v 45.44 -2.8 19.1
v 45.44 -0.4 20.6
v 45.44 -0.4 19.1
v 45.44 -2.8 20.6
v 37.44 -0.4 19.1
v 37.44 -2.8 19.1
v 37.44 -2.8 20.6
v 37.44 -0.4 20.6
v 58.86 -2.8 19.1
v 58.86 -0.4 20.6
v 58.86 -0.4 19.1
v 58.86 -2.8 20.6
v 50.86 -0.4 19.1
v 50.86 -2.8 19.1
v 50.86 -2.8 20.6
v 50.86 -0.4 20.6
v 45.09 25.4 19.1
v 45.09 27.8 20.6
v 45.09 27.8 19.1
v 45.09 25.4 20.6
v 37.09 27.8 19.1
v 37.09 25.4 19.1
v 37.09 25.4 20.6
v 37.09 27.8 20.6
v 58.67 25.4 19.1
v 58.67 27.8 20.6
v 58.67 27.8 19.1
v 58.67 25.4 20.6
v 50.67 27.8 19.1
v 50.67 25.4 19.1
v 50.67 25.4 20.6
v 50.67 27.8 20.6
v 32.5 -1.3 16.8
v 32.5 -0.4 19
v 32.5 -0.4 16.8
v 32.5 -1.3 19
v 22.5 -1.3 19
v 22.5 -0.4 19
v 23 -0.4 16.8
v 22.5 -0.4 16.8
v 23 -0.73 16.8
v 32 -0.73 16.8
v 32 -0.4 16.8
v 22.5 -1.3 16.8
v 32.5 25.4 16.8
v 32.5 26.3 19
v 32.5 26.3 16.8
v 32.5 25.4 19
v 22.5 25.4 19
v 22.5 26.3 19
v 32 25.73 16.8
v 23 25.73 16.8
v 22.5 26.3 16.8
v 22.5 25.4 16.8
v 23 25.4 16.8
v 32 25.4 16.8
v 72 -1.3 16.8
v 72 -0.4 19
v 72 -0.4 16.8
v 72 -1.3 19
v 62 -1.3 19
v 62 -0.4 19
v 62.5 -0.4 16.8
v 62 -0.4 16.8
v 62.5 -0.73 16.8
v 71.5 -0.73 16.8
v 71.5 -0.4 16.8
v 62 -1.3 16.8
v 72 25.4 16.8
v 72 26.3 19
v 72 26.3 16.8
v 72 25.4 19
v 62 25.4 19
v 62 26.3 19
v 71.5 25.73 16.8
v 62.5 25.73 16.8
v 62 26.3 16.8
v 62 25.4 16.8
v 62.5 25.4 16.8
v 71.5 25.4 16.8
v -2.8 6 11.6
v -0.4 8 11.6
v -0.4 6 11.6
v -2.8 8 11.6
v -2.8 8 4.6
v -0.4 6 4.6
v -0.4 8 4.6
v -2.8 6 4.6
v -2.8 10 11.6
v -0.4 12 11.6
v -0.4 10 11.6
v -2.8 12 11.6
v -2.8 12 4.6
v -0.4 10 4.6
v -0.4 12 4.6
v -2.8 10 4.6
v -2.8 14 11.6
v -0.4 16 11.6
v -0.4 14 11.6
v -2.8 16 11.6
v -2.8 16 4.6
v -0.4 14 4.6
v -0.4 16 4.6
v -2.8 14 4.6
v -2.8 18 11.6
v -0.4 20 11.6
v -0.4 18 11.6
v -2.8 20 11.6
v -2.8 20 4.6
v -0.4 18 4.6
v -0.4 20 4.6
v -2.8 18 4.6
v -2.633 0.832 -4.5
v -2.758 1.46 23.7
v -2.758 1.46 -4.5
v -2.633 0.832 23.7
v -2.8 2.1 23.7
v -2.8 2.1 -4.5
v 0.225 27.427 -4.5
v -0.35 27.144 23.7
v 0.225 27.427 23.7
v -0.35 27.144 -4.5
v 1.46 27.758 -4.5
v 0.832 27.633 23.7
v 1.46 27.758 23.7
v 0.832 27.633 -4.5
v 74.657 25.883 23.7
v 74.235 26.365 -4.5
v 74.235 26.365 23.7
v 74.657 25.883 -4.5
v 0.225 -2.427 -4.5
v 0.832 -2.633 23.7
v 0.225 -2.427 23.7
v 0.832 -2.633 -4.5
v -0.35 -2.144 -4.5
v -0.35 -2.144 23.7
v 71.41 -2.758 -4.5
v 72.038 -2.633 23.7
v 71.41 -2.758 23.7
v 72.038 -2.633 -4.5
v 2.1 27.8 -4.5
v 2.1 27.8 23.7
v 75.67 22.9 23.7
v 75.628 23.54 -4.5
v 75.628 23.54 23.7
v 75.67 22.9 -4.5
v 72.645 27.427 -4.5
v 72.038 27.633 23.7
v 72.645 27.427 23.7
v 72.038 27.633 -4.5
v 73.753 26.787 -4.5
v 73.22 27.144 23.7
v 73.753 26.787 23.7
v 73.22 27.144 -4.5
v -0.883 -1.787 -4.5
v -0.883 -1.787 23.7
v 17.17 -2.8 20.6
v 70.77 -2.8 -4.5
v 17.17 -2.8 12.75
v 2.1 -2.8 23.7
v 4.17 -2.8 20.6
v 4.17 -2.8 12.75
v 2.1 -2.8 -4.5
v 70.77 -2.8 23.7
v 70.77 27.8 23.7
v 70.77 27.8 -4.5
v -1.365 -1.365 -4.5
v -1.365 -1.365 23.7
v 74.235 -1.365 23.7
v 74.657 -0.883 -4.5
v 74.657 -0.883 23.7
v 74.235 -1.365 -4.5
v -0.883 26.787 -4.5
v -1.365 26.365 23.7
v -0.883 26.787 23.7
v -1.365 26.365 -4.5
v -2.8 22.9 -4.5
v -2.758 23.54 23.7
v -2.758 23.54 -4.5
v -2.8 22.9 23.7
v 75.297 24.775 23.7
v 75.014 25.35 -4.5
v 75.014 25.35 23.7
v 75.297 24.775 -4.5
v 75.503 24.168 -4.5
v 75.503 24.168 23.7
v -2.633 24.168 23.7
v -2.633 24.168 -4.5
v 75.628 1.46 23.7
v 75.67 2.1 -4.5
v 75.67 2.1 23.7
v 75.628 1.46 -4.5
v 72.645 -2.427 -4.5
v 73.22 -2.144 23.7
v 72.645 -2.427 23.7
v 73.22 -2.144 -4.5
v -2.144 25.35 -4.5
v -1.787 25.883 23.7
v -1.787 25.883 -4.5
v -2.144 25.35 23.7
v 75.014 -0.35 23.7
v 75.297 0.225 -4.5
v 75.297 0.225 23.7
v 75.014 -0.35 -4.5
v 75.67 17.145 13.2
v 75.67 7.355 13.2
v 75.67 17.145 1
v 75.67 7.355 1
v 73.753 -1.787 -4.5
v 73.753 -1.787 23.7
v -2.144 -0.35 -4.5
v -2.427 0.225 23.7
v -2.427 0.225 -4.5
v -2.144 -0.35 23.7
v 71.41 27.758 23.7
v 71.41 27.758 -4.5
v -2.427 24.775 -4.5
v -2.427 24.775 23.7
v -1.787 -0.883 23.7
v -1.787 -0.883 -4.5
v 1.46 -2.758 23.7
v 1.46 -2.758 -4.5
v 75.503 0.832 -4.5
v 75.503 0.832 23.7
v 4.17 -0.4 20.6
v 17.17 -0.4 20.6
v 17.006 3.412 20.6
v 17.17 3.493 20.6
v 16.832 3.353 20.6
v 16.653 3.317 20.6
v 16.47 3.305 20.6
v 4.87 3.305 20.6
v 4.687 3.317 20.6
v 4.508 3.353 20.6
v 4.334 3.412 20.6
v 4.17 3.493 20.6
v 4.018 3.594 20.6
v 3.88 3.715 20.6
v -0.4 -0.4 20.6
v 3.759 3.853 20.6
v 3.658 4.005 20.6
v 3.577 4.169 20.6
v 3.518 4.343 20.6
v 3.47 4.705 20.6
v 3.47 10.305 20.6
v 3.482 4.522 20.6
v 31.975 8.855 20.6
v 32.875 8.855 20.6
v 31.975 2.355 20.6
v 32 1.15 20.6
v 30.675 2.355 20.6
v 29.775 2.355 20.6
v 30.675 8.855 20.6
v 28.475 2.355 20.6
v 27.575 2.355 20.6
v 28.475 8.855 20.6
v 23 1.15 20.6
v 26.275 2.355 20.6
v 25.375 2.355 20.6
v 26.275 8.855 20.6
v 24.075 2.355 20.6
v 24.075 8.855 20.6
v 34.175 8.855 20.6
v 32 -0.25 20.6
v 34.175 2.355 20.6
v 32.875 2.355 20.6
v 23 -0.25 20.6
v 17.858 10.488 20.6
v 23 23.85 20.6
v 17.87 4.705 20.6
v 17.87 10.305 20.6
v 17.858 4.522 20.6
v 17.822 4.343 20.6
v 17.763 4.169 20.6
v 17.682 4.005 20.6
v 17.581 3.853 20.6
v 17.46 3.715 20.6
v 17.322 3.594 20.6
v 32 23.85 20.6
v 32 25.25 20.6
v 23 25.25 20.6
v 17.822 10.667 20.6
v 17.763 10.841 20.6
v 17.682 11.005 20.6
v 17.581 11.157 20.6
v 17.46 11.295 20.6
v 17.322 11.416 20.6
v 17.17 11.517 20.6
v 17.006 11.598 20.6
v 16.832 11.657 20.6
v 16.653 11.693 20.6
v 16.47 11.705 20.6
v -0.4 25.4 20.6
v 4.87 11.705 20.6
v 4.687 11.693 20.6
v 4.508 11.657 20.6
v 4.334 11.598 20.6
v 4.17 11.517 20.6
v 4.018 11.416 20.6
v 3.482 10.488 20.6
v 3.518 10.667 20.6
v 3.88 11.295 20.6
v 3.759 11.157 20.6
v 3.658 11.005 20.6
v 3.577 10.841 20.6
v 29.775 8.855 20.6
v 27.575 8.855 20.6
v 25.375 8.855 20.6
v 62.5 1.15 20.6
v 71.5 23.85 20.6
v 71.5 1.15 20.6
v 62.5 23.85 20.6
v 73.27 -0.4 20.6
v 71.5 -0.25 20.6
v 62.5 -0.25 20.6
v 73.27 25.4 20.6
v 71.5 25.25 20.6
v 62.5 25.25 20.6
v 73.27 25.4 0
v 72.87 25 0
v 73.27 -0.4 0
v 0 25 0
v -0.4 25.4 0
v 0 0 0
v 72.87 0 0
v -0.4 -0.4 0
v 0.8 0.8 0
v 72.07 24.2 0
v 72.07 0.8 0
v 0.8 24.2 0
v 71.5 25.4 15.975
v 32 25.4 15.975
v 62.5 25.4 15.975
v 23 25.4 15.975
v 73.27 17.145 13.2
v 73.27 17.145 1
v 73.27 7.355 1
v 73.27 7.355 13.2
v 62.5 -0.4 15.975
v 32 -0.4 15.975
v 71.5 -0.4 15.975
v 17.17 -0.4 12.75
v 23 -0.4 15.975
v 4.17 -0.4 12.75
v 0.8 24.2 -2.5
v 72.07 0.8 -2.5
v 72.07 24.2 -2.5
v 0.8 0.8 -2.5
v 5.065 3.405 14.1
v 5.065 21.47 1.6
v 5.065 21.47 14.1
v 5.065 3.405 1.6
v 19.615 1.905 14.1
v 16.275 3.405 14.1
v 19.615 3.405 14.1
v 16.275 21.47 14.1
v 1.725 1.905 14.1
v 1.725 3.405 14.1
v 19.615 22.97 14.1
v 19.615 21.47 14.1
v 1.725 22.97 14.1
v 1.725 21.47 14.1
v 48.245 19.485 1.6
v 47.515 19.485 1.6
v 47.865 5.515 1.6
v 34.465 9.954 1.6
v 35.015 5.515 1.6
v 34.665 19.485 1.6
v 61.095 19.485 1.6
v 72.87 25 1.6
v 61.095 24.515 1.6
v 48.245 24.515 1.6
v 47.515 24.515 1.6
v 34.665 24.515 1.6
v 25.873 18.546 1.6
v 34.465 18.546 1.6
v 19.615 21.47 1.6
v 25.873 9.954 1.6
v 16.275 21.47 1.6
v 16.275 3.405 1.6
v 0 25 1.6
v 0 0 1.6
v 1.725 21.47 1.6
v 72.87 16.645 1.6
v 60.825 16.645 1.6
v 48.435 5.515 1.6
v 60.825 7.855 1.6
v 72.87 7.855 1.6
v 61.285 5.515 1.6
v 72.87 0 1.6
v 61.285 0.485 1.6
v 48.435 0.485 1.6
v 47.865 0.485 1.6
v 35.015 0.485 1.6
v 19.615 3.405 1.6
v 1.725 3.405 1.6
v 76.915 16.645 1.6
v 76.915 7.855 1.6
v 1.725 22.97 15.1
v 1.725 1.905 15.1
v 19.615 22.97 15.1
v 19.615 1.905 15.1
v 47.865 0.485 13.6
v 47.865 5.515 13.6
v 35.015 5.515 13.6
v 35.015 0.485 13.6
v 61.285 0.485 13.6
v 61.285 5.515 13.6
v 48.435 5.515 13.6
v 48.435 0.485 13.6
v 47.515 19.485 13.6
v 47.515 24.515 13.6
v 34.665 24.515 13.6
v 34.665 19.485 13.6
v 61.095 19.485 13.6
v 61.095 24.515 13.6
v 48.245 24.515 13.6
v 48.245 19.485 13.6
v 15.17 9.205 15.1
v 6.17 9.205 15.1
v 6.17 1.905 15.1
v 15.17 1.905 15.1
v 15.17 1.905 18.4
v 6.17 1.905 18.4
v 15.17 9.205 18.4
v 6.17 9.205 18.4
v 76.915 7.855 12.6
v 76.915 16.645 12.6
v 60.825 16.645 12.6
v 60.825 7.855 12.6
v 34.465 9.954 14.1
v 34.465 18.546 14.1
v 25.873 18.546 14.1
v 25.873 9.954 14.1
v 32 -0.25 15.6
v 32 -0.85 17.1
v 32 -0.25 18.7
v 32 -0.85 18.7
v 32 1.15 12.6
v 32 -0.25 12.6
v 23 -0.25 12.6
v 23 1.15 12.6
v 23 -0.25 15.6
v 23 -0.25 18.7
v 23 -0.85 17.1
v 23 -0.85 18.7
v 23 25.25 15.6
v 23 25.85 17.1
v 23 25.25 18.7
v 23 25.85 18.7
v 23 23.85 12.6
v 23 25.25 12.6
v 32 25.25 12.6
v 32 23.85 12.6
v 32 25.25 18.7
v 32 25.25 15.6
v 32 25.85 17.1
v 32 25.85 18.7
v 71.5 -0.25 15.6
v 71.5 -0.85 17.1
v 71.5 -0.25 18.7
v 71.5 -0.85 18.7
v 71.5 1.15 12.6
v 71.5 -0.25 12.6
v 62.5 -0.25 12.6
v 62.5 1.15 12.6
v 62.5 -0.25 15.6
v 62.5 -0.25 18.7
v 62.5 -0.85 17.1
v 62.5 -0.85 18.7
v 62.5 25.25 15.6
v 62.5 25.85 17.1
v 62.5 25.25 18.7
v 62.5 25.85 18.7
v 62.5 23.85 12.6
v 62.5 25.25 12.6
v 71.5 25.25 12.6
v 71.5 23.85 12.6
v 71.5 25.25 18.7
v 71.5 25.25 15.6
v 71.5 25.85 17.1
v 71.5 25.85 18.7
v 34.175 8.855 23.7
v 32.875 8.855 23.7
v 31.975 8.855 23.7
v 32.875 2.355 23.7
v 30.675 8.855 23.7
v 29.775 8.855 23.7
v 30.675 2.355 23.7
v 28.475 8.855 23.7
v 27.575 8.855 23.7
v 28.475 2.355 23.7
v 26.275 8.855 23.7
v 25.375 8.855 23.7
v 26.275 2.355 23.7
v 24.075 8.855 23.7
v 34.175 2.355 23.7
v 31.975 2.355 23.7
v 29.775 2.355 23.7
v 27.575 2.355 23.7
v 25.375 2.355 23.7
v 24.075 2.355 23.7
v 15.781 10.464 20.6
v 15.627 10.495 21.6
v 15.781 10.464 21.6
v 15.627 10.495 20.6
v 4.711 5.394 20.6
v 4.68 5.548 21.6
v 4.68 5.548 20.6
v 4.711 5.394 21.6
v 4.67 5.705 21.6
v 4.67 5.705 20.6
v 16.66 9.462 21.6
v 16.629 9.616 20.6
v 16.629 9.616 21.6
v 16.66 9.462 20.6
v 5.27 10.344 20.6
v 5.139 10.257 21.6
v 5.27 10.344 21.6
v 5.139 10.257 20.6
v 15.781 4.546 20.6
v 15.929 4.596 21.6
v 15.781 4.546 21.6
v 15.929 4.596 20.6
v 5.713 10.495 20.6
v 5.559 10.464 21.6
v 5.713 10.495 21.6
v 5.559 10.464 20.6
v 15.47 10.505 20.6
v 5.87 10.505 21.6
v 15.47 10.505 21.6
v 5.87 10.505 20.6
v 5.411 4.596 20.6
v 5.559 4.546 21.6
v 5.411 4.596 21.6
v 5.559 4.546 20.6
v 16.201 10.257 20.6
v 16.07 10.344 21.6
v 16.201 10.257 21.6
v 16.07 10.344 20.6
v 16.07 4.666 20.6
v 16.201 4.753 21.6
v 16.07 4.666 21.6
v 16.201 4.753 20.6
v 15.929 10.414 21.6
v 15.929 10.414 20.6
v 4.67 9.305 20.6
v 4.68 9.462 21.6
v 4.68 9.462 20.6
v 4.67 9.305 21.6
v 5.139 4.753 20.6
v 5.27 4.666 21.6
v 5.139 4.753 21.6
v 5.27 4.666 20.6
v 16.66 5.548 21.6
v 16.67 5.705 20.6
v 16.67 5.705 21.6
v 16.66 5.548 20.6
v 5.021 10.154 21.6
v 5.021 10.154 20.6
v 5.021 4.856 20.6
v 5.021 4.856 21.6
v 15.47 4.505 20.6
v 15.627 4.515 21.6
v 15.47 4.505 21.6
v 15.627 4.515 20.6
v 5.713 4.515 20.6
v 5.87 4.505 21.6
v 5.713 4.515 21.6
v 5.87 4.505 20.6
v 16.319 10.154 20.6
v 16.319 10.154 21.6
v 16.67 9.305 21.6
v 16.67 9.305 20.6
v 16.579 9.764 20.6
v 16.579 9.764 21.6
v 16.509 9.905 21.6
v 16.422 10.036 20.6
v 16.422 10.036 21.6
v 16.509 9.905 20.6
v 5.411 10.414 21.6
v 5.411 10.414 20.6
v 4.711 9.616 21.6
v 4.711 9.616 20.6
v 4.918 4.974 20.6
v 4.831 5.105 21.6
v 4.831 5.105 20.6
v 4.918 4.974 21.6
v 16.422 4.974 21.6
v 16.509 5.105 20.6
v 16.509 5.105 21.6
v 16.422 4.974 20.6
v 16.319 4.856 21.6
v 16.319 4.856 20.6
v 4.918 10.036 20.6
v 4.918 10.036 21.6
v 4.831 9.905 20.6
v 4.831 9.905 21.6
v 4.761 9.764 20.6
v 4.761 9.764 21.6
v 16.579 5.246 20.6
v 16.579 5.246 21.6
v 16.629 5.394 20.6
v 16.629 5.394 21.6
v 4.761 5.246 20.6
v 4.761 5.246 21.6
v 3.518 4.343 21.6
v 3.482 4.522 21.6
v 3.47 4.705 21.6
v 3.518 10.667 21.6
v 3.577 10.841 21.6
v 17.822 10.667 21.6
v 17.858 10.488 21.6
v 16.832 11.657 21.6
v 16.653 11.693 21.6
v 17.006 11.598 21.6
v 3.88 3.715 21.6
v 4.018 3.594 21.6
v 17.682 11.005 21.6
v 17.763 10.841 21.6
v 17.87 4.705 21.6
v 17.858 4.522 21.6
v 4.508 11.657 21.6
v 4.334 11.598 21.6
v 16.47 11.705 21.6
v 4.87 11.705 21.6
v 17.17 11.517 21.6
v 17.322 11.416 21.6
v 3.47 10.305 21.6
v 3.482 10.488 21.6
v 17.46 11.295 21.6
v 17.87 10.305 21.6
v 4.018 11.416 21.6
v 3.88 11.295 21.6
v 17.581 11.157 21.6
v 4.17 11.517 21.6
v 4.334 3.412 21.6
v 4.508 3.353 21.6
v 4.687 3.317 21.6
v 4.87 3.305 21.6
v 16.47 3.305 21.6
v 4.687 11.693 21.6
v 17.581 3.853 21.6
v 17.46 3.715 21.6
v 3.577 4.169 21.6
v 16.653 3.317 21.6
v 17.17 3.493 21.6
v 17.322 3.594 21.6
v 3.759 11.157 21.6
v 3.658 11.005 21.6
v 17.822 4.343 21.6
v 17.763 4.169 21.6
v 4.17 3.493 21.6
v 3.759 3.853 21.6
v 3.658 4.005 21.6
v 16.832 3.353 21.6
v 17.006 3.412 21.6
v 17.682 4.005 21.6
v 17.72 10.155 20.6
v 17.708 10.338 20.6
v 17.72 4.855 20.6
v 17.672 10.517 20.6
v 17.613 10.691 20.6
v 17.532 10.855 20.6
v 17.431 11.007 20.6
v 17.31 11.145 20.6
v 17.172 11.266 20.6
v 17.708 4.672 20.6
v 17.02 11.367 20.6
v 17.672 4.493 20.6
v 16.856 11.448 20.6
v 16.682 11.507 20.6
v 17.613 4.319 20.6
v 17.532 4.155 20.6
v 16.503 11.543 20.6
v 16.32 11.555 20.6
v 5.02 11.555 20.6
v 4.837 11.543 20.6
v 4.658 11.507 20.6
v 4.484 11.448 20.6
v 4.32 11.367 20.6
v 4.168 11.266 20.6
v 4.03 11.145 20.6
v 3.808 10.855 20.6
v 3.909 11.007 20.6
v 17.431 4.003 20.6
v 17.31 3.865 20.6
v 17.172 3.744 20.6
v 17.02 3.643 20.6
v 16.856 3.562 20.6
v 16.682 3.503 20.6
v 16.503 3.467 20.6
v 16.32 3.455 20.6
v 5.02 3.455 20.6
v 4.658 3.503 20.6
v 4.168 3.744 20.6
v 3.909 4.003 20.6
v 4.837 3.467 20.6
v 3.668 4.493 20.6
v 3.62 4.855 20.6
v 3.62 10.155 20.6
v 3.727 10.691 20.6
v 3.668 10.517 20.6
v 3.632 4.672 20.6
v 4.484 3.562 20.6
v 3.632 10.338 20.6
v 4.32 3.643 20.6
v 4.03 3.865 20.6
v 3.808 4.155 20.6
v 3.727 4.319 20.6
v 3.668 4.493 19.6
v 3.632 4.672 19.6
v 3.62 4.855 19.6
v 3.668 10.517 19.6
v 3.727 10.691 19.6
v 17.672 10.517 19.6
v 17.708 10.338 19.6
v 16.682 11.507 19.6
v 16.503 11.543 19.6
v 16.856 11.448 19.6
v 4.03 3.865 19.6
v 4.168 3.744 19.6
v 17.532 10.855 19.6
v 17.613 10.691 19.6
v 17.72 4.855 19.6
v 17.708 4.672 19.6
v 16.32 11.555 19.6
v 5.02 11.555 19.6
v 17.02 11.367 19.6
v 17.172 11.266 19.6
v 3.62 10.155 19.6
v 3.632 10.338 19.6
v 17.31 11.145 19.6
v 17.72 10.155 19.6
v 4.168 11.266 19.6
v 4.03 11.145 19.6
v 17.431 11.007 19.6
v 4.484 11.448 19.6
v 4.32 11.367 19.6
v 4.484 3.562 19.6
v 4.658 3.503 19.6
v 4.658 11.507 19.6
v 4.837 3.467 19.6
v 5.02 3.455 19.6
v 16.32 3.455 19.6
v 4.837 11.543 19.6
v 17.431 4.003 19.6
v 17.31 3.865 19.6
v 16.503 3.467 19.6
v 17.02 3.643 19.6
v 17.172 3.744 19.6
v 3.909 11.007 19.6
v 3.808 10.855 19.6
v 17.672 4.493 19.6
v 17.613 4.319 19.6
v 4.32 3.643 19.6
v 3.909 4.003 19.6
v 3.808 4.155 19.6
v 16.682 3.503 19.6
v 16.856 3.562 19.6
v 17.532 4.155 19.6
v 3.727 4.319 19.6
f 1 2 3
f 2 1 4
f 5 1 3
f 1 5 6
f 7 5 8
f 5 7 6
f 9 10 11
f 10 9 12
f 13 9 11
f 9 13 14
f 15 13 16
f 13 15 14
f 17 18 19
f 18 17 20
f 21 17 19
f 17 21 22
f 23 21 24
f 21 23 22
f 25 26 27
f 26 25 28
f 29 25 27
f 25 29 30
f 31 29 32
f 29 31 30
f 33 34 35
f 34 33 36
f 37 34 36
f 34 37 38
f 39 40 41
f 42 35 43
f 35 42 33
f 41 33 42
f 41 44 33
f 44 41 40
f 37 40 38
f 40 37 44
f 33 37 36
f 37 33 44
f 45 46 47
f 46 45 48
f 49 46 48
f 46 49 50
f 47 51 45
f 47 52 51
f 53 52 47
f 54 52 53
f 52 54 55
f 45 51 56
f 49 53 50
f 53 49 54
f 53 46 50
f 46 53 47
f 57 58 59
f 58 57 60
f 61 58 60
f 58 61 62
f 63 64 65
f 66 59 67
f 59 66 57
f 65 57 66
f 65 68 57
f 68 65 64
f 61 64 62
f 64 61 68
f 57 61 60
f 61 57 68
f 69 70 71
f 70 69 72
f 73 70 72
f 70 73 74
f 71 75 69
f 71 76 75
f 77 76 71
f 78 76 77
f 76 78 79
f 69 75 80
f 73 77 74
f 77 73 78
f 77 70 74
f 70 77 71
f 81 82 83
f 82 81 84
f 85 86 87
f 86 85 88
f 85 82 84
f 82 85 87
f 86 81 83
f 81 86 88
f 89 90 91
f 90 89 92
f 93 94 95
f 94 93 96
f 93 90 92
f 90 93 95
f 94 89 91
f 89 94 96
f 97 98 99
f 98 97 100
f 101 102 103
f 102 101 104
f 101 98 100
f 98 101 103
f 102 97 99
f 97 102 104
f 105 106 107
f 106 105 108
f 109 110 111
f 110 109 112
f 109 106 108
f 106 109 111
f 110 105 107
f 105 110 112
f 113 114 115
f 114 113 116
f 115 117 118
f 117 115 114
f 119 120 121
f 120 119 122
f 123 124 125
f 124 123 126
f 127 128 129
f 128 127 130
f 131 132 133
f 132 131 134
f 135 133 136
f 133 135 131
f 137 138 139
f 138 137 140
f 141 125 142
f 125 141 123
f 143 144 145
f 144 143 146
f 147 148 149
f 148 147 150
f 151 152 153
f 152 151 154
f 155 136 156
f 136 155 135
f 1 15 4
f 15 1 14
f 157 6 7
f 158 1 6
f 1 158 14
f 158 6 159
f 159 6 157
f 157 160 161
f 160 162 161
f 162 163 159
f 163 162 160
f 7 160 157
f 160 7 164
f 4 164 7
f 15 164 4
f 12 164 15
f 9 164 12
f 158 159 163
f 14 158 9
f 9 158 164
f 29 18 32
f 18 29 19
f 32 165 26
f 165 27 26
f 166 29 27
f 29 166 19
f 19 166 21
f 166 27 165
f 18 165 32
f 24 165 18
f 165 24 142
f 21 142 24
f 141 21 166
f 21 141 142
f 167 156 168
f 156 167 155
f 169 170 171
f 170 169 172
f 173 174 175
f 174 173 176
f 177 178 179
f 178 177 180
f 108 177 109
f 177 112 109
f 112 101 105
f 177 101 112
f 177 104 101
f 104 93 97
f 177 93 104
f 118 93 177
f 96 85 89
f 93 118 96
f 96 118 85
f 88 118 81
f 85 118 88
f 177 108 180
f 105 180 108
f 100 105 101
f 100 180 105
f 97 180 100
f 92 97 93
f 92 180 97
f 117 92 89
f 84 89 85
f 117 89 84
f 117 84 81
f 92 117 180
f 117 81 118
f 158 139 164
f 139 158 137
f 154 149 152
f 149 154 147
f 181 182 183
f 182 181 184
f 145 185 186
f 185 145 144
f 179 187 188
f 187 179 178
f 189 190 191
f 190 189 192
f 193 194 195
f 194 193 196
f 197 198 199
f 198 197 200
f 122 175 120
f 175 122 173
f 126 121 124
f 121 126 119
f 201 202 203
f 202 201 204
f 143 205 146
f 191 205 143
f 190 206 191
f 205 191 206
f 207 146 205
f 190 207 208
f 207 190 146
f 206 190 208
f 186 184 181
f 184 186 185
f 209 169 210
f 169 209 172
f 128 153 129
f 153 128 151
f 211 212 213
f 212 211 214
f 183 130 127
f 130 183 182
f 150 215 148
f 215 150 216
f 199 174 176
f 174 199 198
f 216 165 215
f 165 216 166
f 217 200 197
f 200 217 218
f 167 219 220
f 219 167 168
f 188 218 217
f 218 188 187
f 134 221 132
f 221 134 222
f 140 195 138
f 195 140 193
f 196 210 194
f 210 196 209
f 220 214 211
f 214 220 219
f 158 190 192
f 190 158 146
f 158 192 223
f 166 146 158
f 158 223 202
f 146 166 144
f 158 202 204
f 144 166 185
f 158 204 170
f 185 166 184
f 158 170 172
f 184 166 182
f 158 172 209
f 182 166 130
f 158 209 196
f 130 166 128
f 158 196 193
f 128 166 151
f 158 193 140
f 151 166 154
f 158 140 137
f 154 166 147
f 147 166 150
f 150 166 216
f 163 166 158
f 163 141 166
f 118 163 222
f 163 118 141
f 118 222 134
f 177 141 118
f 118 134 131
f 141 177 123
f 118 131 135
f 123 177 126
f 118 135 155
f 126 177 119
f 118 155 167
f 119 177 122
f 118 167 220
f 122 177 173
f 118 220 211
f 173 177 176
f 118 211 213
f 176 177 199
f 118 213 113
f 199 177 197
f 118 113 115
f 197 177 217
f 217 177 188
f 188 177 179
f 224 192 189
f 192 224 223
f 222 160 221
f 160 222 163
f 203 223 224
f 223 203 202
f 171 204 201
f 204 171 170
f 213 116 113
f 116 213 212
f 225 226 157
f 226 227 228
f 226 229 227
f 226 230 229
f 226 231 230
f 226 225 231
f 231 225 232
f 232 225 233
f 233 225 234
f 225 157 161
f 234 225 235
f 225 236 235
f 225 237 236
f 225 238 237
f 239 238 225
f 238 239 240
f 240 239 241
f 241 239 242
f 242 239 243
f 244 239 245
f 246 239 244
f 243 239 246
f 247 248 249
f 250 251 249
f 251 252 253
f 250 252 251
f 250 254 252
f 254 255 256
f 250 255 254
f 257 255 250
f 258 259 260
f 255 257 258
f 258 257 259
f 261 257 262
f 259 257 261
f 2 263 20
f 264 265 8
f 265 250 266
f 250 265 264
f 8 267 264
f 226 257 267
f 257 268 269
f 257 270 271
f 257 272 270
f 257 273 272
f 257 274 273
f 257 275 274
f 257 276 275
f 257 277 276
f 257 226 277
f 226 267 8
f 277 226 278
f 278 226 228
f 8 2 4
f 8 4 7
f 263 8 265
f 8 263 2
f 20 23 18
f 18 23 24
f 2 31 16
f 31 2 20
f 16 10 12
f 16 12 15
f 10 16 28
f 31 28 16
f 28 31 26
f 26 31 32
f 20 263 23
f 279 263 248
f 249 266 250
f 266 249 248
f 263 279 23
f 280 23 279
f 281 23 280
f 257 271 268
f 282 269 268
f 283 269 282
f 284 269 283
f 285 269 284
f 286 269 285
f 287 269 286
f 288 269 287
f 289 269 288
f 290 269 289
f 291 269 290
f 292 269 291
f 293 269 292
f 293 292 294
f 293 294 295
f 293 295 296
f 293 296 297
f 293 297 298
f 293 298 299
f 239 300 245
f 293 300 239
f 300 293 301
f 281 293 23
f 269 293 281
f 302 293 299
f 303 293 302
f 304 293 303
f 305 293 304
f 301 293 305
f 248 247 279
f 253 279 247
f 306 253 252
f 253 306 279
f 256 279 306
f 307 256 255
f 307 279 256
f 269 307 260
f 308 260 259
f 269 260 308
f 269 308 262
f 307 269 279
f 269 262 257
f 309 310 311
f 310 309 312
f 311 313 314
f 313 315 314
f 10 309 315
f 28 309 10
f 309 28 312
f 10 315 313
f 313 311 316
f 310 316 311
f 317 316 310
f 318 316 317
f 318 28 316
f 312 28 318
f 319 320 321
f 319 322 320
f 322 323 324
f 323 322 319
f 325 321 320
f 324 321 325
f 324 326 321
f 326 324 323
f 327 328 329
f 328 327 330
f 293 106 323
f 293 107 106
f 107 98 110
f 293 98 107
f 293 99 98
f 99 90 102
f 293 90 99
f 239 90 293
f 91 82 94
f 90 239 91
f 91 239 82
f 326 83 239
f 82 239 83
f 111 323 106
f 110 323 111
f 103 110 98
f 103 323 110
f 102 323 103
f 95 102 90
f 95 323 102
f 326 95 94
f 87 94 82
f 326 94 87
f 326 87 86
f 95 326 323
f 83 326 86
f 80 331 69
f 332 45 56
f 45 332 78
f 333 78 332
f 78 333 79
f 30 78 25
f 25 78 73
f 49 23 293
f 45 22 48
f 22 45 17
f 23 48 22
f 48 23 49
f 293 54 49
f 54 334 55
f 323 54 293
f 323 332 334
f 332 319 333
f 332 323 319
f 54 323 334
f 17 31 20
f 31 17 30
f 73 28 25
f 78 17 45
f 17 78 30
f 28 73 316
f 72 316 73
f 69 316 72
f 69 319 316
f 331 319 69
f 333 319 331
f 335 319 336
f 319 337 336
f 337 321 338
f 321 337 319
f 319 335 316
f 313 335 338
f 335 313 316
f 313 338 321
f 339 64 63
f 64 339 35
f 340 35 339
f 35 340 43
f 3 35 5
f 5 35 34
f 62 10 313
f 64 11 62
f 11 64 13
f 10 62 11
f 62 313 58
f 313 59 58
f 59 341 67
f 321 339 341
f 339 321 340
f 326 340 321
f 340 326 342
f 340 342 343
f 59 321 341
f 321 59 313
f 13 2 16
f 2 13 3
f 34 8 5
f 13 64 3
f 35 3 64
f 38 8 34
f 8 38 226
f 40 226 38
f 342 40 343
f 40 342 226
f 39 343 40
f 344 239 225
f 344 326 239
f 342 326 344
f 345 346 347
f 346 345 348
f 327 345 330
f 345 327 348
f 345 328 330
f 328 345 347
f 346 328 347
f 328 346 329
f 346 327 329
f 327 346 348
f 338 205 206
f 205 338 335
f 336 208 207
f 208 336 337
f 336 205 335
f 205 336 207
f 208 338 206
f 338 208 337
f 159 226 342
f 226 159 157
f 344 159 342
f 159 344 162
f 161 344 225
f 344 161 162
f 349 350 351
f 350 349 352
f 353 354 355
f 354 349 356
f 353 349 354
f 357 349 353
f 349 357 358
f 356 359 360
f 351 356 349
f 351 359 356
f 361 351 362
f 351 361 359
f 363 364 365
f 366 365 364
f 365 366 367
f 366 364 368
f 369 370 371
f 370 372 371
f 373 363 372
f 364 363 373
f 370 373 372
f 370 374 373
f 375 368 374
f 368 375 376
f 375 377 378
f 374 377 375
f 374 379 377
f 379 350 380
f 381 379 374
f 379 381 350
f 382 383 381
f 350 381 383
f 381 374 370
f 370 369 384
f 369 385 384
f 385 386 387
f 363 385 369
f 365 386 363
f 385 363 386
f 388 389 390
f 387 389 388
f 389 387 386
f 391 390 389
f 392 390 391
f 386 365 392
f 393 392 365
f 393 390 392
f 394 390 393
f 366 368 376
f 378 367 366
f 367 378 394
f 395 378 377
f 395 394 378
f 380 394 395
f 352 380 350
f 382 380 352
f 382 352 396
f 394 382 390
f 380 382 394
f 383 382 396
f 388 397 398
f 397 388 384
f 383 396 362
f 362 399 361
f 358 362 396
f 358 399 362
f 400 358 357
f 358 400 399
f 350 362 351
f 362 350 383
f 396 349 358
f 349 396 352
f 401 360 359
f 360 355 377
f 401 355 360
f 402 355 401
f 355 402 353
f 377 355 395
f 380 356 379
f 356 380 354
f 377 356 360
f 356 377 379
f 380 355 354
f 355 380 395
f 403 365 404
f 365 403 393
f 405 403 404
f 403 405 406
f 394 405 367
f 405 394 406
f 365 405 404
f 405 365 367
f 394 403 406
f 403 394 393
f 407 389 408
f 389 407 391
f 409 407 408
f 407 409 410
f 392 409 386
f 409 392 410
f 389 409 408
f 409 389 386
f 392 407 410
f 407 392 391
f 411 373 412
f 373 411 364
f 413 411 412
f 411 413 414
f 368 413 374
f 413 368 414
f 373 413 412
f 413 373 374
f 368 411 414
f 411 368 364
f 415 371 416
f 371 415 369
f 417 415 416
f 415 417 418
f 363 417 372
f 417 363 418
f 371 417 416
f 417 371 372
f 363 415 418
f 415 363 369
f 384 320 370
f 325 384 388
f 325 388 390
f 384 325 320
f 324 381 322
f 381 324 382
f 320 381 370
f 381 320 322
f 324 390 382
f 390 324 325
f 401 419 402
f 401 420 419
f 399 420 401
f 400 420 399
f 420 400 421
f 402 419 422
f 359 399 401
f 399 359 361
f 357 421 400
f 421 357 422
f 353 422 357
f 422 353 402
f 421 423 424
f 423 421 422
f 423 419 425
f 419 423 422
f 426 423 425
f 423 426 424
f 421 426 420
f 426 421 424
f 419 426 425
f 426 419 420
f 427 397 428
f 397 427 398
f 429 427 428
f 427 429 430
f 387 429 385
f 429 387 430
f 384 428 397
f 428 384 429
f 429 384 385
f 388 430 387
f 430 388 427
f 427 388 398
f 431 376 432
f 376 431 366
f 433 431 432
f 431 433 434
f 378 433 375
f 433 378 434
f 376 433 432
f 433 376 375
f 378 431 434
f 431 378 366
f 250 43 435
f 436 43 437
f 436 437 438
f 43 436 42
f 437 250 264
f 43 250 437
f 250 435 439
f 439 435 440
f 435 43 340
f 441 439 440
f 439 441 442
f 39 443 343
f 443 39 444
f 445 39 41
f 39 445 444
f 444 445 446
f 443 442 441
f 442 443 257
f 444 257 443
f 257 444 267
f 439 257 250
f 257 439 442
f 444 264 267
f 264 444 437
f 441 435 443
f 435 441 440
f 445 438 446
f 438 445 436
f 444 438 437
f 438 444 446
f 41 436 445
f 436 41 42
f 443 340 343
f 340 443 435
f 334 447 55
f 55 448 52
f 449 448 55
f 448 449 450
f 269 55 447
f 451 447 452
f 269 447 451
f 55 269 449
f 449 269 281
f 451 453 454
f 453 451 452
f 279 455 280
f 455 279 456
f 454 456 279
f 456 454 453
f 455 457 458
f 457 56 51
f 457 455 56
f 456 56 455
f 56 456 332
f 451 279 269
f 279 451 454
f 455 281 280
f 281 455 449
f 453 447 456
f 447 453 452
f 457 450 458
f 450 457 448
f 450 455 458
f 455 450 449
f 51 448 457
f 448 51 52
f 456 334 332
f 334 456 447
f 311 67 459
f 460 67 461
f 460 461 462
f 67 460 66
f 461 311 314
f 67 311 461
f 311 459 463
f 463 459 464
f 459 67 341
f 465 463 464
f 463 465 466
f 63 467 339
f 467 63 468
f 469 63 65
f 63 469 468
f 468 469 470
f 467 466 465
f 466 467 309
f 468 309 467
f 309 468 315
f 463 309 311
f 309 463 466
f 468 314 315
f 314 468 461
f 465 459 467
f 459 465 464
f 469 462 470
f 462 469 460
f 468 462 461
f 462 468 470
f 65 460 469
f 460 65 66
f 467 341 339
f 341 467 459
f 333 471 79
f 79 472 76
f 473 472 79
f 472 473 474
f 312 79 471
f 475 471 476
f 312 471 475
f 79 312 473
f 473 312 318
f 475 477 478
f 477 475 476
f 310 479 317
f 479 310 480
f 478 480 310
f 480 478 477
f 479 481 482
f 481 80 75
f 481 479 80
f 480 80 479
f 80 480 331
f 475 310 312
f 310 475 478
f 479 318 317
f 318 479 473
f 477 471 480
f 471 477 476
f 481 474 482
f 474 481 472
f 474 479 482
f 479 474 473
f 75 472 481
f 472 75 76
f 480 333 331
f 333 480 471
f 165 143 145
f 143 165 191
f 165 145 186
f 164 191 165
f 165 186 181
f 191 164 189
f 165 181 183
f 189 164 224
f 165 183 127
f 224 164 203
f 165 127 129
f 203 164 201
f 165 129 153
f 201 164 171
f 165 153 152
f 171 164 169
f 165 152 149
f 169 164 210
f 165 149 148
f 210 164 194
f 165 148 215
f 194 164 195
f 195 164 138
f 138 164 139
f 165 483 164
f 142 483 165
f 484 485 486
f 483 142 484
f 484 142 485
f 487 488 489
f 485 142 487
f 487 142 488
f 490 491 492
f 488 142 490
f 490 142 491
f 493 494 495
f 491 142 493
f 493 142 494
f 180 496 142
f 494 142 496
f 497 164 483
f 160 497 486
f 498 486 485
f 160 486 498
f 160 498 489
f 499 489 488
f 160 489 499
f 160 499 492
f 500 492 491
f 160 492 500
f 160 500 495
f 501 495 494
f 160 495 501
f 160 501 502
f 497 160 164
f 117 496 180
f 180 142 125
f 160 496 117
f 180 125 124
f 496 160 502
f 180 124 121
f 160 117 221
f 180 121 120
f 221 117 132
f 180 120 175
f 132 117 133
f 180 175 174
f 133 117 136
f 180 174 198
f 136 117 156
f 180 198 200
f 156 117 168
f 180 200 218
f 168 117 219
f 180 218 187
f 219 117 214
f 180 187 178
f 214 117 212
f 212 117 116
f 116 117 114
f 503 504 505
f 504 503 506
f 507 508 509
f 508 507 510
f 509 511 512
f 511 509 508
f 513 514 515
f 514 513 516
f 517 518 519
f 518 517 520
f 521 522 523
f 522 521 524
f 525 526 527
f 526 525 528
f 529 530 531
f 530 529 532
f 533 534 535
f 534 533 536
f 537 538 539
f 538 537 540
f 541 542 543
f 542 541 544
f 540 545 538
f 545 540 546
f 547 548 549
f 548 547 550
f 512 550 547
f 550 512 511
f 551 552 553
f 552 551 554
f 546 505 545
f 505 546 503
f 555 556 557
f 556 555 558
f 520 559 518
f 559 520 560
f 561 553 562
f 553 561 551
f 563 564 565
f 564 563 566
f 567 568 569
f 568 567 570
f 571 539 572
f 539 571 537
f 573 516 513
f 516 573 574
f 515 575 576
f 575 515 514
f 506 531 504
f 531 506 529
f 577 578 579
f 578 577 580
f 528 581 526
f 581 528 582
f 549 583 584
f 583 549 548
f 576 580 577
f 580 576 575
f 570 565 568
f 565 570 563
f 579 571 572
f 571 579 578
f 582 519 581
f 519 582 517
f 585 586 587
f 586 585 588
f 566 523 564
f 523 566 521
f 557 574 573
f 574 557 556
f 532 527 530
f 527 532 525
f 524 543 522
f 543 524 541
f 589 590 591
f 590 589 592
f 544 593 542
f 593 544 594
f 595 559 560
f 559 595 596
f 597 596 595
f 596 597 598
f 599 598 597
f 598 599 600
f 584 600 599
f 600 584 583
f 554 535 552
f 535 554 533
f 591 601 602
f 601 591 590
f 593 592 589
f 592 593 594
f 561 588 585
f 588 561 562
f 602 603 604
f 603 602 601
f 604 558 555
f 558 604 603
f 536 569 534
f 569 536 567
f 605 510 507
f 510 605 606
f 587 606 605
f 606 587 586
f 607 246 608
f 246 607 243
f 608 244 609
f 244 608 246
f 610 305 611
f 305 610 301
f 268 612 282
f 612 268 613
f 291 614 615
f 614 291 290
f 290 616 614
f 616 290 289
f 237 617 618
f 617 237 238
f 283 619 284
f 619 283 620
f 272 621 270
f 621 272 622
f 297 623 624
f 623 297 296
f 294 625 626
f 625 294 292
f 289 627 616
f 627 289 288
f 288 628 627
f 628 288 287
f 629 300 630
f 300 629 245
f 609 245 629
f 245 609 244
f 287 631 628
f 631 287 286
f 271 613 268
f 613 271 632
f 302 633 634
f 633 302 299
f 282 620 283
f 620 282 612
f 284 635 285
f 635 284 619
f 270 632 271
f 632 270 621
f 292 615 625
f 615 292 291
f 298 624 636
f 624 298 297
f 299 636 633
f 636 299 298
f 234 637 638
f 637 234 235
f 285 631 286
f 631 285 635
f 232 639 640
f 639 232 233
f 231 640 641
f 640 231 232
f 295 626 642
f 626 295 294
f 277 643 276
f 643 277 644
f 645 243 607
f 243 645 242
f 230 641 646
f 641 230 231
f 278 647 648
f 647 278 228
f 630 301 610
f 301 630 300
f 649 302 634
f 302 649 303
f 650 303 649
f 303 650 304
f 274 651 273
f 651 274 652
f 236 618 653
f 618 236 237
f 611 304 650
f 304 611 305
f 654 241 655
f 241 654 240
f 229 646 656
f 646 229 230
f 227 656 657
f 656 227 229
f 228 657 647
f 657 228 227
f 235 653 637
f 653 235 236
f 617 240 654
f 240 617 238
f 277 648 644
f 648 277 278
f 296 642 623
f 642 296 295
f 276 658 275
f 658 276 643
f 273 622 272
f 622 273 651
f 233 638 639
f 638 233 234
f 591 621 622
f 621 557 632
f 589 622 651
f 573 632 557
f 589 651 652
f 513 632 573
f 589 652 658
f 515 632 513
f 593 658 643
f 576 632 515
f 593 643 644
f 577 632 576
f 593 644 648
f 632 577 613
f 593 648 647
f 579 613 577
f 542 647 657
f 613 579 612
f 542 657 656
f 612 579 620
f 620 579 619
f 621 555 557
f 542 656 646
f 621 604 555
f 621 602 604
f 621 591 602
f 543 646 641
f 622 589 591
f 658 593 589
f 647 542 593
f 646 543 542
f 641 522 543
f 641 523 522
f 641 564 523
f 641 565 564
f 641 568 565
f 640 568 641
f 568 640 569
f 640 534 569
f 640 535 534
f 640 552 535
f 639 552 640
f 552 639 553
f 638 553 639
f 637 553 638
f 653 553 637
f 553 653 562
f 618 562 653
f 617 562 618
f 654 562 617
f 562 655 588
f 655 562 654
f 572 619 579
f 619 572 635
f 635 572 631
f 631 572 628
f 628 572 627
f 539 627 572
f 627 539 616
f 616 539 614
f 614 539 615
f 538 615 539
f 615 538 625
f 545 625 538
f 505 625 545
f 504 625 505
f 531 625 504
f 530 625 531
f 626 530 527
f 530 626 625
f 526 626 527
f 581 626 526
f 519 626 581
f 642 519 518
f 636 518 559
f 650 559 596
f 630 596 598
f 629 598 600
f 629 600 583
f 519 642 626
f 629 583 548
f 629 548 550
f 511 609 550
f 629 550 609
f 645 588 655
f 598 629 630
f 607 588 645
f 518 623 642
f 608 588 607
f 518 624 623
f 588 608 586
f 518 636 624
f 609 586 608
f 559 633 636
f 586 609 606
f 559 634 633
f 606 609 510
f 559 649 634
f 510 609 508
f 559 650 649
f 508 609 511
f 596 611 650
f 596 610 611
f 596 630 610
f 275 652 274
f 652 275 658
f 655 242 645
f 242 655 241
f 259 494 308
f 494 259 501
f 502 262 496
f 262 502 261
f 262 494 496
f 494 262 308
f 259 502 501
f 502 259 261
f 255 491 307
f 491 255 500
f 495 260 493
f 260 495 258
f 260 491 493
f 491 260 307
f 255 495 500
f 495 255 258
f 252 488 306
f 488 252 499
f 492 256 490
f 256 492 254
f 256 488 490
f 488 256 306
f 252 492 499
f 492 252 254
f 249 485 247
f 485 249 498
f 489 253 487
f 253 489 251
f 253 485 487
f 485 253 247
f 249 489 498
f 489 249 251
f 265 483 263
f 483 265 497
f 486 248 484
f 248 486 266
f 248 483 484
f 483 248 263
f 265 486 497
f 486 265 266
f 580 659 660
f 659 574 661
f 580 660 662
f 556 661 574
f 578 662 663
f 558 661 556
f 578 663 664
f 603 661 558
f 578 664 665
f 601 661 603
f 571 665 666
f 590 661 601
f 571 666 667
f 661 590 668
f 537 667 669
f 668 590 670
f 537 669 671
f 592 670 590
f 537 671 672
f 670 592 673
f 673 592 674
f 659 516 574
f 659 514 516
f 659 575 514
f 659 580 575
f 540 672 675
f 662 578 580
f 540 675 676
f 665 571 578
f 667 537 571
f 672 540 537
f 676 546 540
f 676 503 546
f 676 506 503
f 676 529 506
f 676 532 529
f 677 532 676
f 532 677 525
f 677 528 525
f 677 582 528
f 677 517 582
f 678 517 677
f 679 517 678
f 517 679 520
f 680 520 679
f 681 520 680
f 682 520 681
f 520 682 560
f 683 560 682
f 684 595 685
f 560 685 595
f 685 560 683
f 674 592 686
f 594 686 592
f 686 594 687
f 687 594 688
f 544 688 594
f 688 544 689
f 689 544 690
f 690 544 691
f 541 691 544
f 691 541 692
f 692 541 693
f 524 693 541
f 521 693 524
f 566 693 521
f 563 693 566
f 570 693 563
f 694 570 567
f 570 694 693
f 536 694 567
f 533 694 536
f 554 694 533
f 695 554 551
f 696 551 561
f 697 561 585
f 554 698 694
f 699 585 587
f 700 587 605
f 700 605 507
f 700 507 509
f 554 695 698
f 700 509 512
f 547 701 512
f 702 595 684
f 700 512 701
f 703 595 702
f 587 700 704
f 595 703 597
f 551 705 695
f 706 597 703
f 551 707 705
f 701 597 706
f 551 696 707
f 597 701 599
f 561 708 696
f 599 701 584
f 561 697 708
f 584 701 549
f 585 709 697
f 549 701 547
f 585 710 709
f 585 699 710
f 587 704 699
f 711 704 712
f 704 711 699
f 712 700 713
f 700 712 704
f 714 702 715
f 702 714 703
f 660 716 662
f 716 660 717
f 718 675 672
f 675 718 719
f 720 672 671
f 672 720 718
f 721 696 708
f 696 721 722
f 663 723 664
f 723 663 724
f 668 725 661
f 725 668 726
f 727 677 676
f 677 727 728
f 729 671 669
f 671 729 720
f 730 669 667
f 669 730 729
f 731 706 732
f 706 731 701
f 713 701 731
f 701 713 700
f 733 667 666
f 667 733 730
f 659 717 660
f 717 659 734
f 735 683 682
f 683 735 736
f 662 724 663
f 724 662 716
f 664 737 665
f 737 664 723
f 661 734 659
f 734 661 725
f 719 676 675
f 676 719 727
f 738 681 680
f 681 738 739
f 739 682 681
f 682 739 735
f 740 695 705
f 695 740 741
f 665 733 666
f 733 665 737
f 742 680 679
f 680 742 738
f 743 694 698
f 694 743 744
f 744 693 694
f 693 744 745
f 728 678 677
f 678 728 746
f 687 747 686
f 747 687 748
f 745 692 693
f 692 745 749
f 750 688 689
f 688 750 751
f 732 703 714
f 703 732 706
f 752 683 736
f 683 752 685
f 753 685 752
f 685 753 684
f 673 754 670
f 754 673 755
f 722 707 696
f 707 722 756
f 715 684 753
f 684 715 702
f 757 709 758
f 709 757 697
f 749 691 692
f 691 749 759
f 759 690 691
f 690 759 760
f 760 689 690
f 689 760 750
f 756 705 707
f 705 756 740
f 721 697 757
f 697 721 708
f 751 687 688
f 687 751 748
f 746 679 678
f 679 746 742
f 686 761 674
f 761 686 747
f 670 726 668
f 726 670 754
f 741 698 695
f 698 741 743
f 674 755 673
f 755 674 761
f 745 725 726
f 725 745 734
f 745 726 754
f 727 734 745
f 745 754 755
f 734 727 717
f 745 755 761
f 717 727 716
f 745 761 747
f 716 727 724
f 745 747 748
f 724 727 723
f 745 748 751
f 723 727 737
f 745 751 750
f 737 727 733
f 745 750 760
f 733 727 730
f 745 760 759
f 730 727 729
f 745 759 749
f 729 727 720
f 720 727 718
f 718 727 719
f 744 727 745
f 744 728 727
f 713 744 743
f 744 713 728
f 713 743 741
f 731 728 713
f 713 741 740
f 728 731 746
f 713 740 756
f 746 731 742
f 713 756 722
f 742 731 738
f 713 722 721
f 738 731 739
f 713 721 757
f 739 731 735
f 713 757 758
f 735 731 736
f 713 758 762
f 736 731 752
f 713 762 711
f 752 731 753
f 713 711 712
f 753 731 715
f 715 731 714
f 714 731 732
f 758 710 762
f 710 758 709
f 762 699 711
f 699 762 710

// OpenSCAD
// file: board_params.scad
// GENERATED by fan-housing/extract_geometry.py
// Do not edit by hand - after a board change, run the script again.

board_l = 72.87;   // X, long side
board_w = 25.0;   // Y, short side

U1_x = [1.7249999999999999, 19.615];  U1_y = [1.905, 22.97];
J1_x = [60.825, 76.915];  J1_y = [6.455, 18.044999999999998];
J2_x = [35.815000000000005, 47.065000000000005];  J2_y = [1.185, 4.815];
J3_x = [49.235, 60.485];  J3_y = [1.185, 4.815];
J4_x = [35.465, 46.715];  J4_y = [20.185, 23.814999999999998];
J5_x = [49.045, 60.295];  J5_y = [20.185, 23.814999999999998];
C1_x = [25.872999999999998, 34.465];  C1_y = [9.953999999999999, 18.546];
U2_x = [23.075, 31.965];  U2_y = [1.355, 8.645];

antenna_x = [0.6699999999999999, 21.669999999999998];  antenna_y = [21.4, 25.0];
// main file
// ===========================================================================
//  Housing for the 4-channel fan controller (Seeed XIAO ESP32-C3)
//
//  Snap-fit, no screws: four spring tabs on the lid latch into pockets in the
//  tray. To open, press the long walls outward a little at the latch points.
//
//  All board dimensions come from board_params.scad, which
//  extract_geometry.py generates from the .kicad_pcb - do not change them here.
//
//  Parts to print:
//    part = "tray"   tray           (cream PETG)
//    part = "lid"    lid            (cream PETG)
//    part = "guide"  light guide    (transparent PETG)
//    part = "all"    see-through assembly for visual inspection
// ===========================================================================

include <board_params.scad>

part = "all";
$fn  = 48;

// Colours for the views only - cream PETG, clear light guide
col_case  = "antiquewhite";
col_guide = "lightcyan";

// ---------------------------------------------------------------- Material
wall     = 2.4;   // side walls
floor_t  = 2.0;   // tray floor
lid_t    = 3.1;   // lid. Deliberately thicker than the walls: cream PETG is
                  // still slightly translucent at 2.4mm, so an LED right
                  // underneath would show as a blotch.
                  //
                  // 3.1 and not 3.0: the layer boundaries sit at
                  // 0.3 + n*0.2, i.e. 2.9 and 3.1. At 3.0 the top of the
                  // lid falls in the MIDDLE of a layer, and the collar of
                  // the light guide claims the same one - the slicer then
                  // aborts with "found slicing result conflict".
                  // Found on the printed part on 2026-09-09: the window sat
                  // one layer too far back on the inside.
fit      = 0.4;   // clearance between board and inner wall (left, right, front, back)
ledge    = 1.2;   // width of the shoulder the board rests on
standoff = 2.5;   // space under the board for the solder joints
pcb_t    = 1.6;
inner_h  = 19.0;  // space above the top of the board. 15 + 4: the socketed XIAO
                  // sits 4mm higher than the catalogue values (see h_socket).
                  // The margin above the tallest part absorbs a 1mm error.
outer_r  = 4.9;   // outside corner radius (plan view). The inside is sharp-cornered
                  // like the board.

// ------------------------------------------------- component heights above PCB
// Not derivable from the .kicad_pcb - footprints carry no height.
h_socket   = 12.5;  // socketed XIAO: board underside above the PCB. Measured on the
                  // real assembly, 4mm more than the 8.5mm of a plain header.
h_xiao_pcb =  1.0;  // XIAO circuit board
h_usbc     =  3.3;  // USB-C receptacle above the XIAO board
h_fan      = 12.0;  // plugged-in fan connector (figure supplied by the owner)
h_jack     = 11.0;  // PJ-102AH body

h_xiao     = h_socket + h_xiao_pcb + h_usbc;   // 16.8 - tallest component

// The plugged-in fan connector is larger than the header underneath. The
// courtyard in the .kicad_pcb only describes the pin header, not its mating
// part - but for collisions the mating part is what counts.
fan_grow_x = 0.8;
fan_grow_y = 0.7;

// ---------------------------------------------------------------- options
usb_opening    = true;   // window for re-flashing without opening
usb_h          = 8.0;    // height of that window, centred on the USB-C receptacle
jack_trim      = 1.4;    // the jack opening is this much narrower than the jack, per side
ears           = true;   // 'mouse ears': thin discs at the four bottom corners that hold
                         // the tray down while it cools. Cut them off after printing.
ear_r          = 8.0;    // radius of an ear, centred on the outer corner
ear_t          = 0.3;    // thickness = one first layer
vents          = true;   // slots above the voltage regulator
light_window   = true;   // window + light guide above the XIAO
guide_loose    = false;  // true: clearance for inserting the guide afterwards,
                         // false: exact fit, printed together in one go
guide_collar_h = 1.0;    // height of the collar (0 = none)
guide_collar_o = 2.4;    // overhang beyond the window, total

// ------------------------------------------------------------------ levels
// Z = 0 is the underside of the board.
z_floor_out = -standoff - floor_t;
z_floor_in  = -standoff;
z_pcb_top   = pcb_t;
z_rim       = pcb_t + inner_h;      // top of the tray, where the lid sits
z_lid_top   = z_rim + lid_t;

// ------------------------------------------------------------- footprint
ox0 = -(fit + wall);   oy0 = -(fit + wall);
outer_l = board_l + 2*(fit + wall);
outer_w = board_w + 2*(fit + wall);

// --------------------------------------------------------------- latches
// Positions along the length: free on both walls of components taller than
// the tab (fan connectors, XIAO, electrolytic cap, barrel jack).
snap_x     = [27.5, 67];
snap_len   = 9;
// Geometry of the spring tab. What matters is the outer-fibre strain at the
// root: eps = 3*t*d / (2*L^2). With t=1.4, d=0.6, L=8 that is about 2%;
// PETG yields at roughly 4-5%. The first design (t=1.6, L=6, d=0.7) came to
// 4.7% - the tab would have snapped off the first time the case was opened.
snap_t     = 1.4;        // thickness
snap_h     = 8.0;        // free length from the underside of the lid
snap_proud = 0.6;        // how far the nose protrudes
snap_gap   = 0.15;       // clearance between tab and inner wall
snap_pk_d  = 0.9;        // depth of the pocket in the wall (out of 2.4mm)

// ------------------------------------------------------- cable exits
notch_w     = 8.0;   // width of the slots for the fan cables
notch_depth = 1.5;   // depth below the top edge of the tray: the cable (0.9 mm) with margin
                     // between tray and lid

fan_x = [ (J2_x[0]+J2_x[1])/2, (J3_x[0]+J3_x[1])/2 ];   // lower long wall
fan_o = [ (J4_x[0]+J4_x[1])/2, (J5_x[0]+J5_x[1])/2 ];   // upper long wall

// ------------------------------------------------------------- light window
// Above the USB-C end of the XIAO - that is where the charge LED sits, and
// where a retrofitted status LED would make the most sense.
win_cx = (U1_x[0] + U1_x[1]) / 2;
win_w  = 12;
win_d  =  6;
win_cy = U1_y[0] + 5.6;   // behind the USB-C receptacle, the tallest part
                          // of the module - a foot in front of it would collide

// ===========================================================================
//  helper shapes
// ===========================================================================

module rrect(w, h, r) {
    hull() for (x = [r, w-r], y = [r, h-r]) translate([x, y]) circle(r = r);
}

// Cuboid from two corner points, handier than translate+cube
module box(x0, y0, z0, x1, y1, z1) {
    translate([x0, y0, z0]) cube([x1-x0, y1-y0, z1-z0]);
}

// ===========================================================================
//  Tray
// ===========================================================================

// Mouse ears: one-layer discs at the four bottom corners. A long, tall tray
// shrinks while it cools and peels up at its ends; the ears add bed contact
// exactly there. They are cut off after printing.
module mouse_ears() {
    for (x = [ox0, ox0 + outer_l], y = [oy0, oy0 + outer_w])
        translate([x, y, z_floor_out]) cylinder(r = ear_r, h = ear_t, $fn = 64);
}

module tray() {
    union() {
    difference() {
        translate([ox0, oy0, z_floor_out])
            linear_extrude(z_rim - z_floor_out)
                rrect(outer_l, outer_w, outer_r);

        // Interior above the underside of the board: the board drops in
        // from above
        translate([-fit, -fit, 0])
            linear_extrude(z_rim - 0 + 1)
                square([board_l + 2*fit, board_w + 2*fit]);

        // Space under the board. The difference to the interior above is the
        // shoulder the board rests on.
        translate([-fit + ledge, -fit + ledge, z_floor_in])
            linear_extrude(0 - z_floor_in + 0.01)
                square([board_l + 2*fit - 2*ledge,
                        board_w + 2*fit - 2*ledge]);

        cable_notches();
        jack_opening();
        if (usb_opening) usb_notch();
        snap_pockets();
        if (vents) side_vents();
    }
    if (ears && part == "tray") mouse_ears();   // only in the print export, not in the views
    }
}

// Slots for the fan cables, open towards the top edge: the cable is laid in
// during assembly instead of threaded through - the fan connector does not
// fit through a closed opening.
module cable_notches() {
    for (x = fan_x)
        box(x - notch_w/2, oy0 - 1, z_rim - notch_depth,
            x + notch_w/2, 1,       z_rim + 1);
    for (x = fan_o)
        box(x - notch_w/2, board_w - 1,  z_rim - notch_depth,
            x + notch_w/2, oy0 + outer_w + 1, z_rim + 1);
}

// Cut-out for the barrel jack. It overhangs the board edge anyway and so
// sticks out of the wall.
module jack_opening() {
    box(board_l - 1,               J1_y[0] - 0.5 + jack_trim, z_pcb_top - 0.6,
        ox0 + outer_l + 1,         J1_y[1] + 0.5 - jack_trim, z_pcb_top + h_jack + 0.6);
}

// USB-C: a window usb_h high, centred on the receptacle of the socketed XIAO.
module usb_notch() {
    w  = 13;
    zc = z_pcb_top + h_socket + h_xiao_pcb + h_usbc/2;
    box(win_cx - w/2, oy0 - 1, zc - usb_h/2,
        win_cx + w/2, 1,       zc + usb_h/2);
}

// Pockets the lid's latch noses snap into.
// A recess in the inner face, NOT a through-cut: it may only mill into the
// wall, otherwise you can see into the housing from outside.
module snap_pockets() {
    for (x = snap_x) {
        box(x - snap_len/2 - 0.5, -fit - snap_pk_d,          z_rim - 3.8,
            x + snap_len/2 + 0.5, -fit + 0.5,                z_rim - 1.6);
        box(x - snap_len/2 - 0.5, board_w + fit - 0.5,       z_rim - 3.8,
            x + snap_len/2 + 0.5, board_w + fit + snap_pk_d, z_rim - 1.6);
    }
}

// The AMS1117 dissipates about 0.7W at a 12V input. Slots in the left end
// wall and in the lid give that heat a way out.
module side_vents() {
    for (i = [0:3])
        box(ox0 - 1,   6 + i*4, z_pcb_top + 3,
            -fit + 1,  8 + i*4, z_pcb_top + 10);
}

// ===========================================================================
//  Lid
// ===========================================================================

module lid() {
    difference() {
        union() {
            translate([ox0, oy0, z_rim])
                linear_extrude(lid_t)
                    rrect(outer_l, outer_w, outer_r);
            snap_tabs();
        }
        if (light_window) light_hole();
        if (vents) lid_vents();
    }
}

module snap_tabs() {
    for (x = snap_x) {
        // lower long wall
        translate([x - snap_len/2, -fit + snap_gap, z_rim - snap_h])
            snap_tab();
        // upper long wall, mirrored
        translate([x + snap_len/2, board_w + fit - snap_gap, z_rim - snap_h])
            rotate([0, 0, 180]) snap_tab();
    }
}

// Tab with a chamfered nose. The chamfer points downward so that the lid
// pushes the tab in by itself when pressed on.
module snap_tab() {
    cube([snap_len, snap_t, snap_h]);
    // Dimensioned from the top of the tab, not from its foot: otherwise the
    // nose moves along when snap_h changes and no longer hits its pocket.
    // Nose z_rim-3.5..z_rim-1.9 in pocket z_rim-3.8..z_rim-1.6.
    hull() {
        translate([0, 0, snap_h - 5.0])
            cube([snap_len, 0.01, 0.01]);
        translate([0, -snap_proud, snap_h - 3.5])
            cube([snap_len, snap_proud, 1.6]);
    }
}

module light_hole() {
    // Through-hole for the head
    translate([win_cx, win_cy, z_rim - 1])
        linear_extrude(lid_t + 2)
            rrect_c(win_w, win_d, 1.2);
    // Recess for the collar on the inside of the lid. Without it the collar
    // does not rest against the lid but sits INSIDE it: it is wider than the
    // window, and the slicer aborts with "found slicing result conflict"
    // (measured 2026-09-08: up to 1.0 mm overhang works, 2.4 mm does not).
    // The recess works since lid_t sits on a layer boundary - see there.
    if (!guide_loose && guide_collar_h > 0)
        translate([win_cx, win_cy, z_rim - 0.01])
            linear_extrude(guide_collar_h + 0.01)
                rrect_c(win_w + guide_collar_o, win_d + guide_collar_o, 1.4);
}

module rrect_c(w, h, r) {
    translate([-w/2, -h/2]) rrect(w, h, r);
}

module lid_vents() {
    for (i = [0:4])
        translate([U2_x[0] + 1 + i*2.2, U2_y[0] + 1, z_rim - 1])
            cube([1.3, 6.5, lid_t + 2]);
}

// ===========================================================================
//  Light guide - print in transparent material
// ===========================================================================

module guide() {
    // Head flush in the lid opening. No clearance: in a two-colour print the
    // two materials fuse at the joint like two adjacent lines of the same
    // material, and that is exactly what is meant to hold it. A gap is only
    // needed if the guide is inserted afterwards - then set guide_loose = true.
    translate([win_cx, win_cy, z_rim])
        linear_extrude(lid_t)
            rrect_c(win_w - (guide_loose ? 0.3 : 0),
                    win_d - (guide_loose ? 0.3 : 0), 1.2);
    // Collar: keeps the guide in the lid. It always sits UNDER the head,
    // i.e. below z_rim. When printed together, the recess in the lid
    // (see light_hole) takes it up; when inserted afterwards, it rests
    // against the inner face. Starting it at z_rim was wrong - that is where
    // the head is, and in print orientation the collar vanished entirely.
    // Without the recess the collar would be wider than the window and rest
    // on the lid, which the slicer rejects as an overlap
    // ("found slicing result conflict", 2026-09-08).
    translate([win_cx, win_cy, z_rim - guide_collar_h])
        linear_extrude(guide_collar_h)
            rrect_c(win_w + guide_collar_o - (guide_loose ? 0 : 0.3),
                    win_d + guide_collar_o - (guide_loose ? 0 : 0.3), 1.4);
    // Deliberately no foot down to the board: the heights of the socketed
    // XIAO are estimates, and a foot that comes out 0.5mm too long would
    // push the lid open.
}

// ===========================================================================
//  Visual inspection
// ===========================================================================

// Thin slice across one latch. Simply cutting away one half lets you look
// too far into the part - you then see more material behind the cut face
// and can no longer tell what belongs to what.
slab = 5;
module cutbox() {
    translate([snap_x[0] - slab/2, -80, -80]) cube([slab, 160, 160]);
}

// Stand-in for the populated board, for the views. a = opacity (1 = solid).
// The jack is drawn as wide as the real one: its footprint courtyard is jack_trim
// wider on each side than the body, and the opening in the wall follows the body.
module board_mock(a = 1) {
    color("darkgreen", a) cube([board_l, board_w, pcb_t]);
    // XIAO: two socket strips, the module board on top, the USB-C receptacle at its low-Y end
    color("dimgray", a) for (x = [U1_x[0], U1_x[1] - 2.54 - 0.8])
        box(x, U1_y[0] + 1.5, z_pcb_top, x + 3.34, U1_y[1] - 1.5, z_pcb_top + h_socket);
    color("gray", a)    box(U1_x[0], U1_y[0], z_pcb_top + h_socket,
                            U1_x[1], U1_y[1], z_pcb_top + h_socket + h_xiao_pcb);
    color("silver", a)  box(win_cx - 4.5, U1_y[0], z_pcb_top + h_socket + h_xiao_pcb,
                            win_cx + 4.5, U1_y[0] + 7.3, z_pcb_top + h_xiao);
    color("white", a)   for (j = [[J2_x, J2_y], [J3_x, J3_y], [J4_x, J4_y], [J5_x, J5_y]])
                            box(j[0][0] - fan_grow_x, j[1][0] - fan_grow_y, z_pcb_top,
                                j[0][1] + fan_grow_x, j[1][1] + fan_grow_y,
                                z_pcb_top + h_fan);
    color("black", a)  box(J1_x[0], J1_y[0] + jack_trim, z_pcb_top,
                           J1_x[1], J1_y[1] - jack_trim, z_pcb_top + h_jack);
    color("lightsteelblue", a) box(C1_x[0], C1_y[0], z_pcb_top,
                           C1_x[1], C1_y[1], z_pcb_top + 12.5);
}

// Printable orientation: lid and light guide are turned by 180 degrees
// together so that their position RELATIVE to each other is kept. Exported
// individually and each placed on Z=0, the height relationships are lost and
// the parts overlap in the window area.
// Both are shifted by the same amount so the relationships stay: in print
// orientation the head of the guide sits at Z 0..3 in the window hole and its
// collar at Z 3..4 above it. If each part were put on Z=0 on its own, both
// would end up at 0..3 and overlap.
if      (part == "lid_print")
    translate([0, 0, z_lid_top]) rotate([180, 0, 0]) lid();
else if (part == "guide_print")
    translate([0, 0, z_lid_top]) rotate([180, 0, 0]) guide();
else if (part == "tray")  color(col_case)
                             translate([0, 0, -z_floor_out]) tray();
else if (part == "lid")   color("wheat")
                             translate([0, 0, z_lid_top]) rotate([180, 0, 0]) lid();
else if (part == "guide") color(col_guide)
                             translate([0, 0, z_lid_top]) rotate([180, 0, 0]) guide();
else if (part == "explode") {
    color(col_case) tray();
    board_mock();
    translate([0, 0, 20]) {
        color("wheat") lid();
        color(col_guide) guide();
    }
}
else if (part == "report") {
    echo(str("OUTER ", outer_l, " ", outer_w, " ", z_lid_top - z_floor_out));
    echo(str("SNAP ", snap_t, " ", snap_h, " ", snap_proud, " ", snap_gap,
             " ", snap_pk_d, " ", fit));
    echo(str("NOSEZ ", z_rim - 3.5, " ", z_rim - 1.9));
    echo(str("POCKZ ", z_rim - 3.8, " ", z_rim - 1.6));
    echo(str("HEAD ", z_rim - z_pcb_top));
    // Spring tabs as cuboids, including the nose
    for (x = snap_x) {
        echo(str("TAB ", x - snap_len/2, " ", x + snap_len/2,
                 " ", -fit + snap_gap - snap_proud, " ", -fit + snap_gap + snap_t,
                 " ", z_rim - snap_h, " ", z_rim));
        echo(str("TAB ", x - snap_len/2, " ", x + snap_len/2,
                 " ", board_w + fit - snap_gap - snap_t,
                 " ", board_w + fit - snap_gap + snap_proud,
                 " ", z_rim - snap_h, " ", z_rim));
    }
    // Components that reach higher than the foot of the spring tabs
    echo(str("PART U1 ", U1_x[0], " ", U1_x[1], " ", U1_y[0], " ", U1_y[1],
             " ", z_pcb_top, " ", z_pcb_top + h_xiao));
    echo(str("PART J1 ", J1_x[0], " ", J1_x[1], " ", J1_y[0], " ", J1_y[1],
             " ", z_pcb_top, " ", z_pcb_top + h_jack));
    for (j = [["J2", J2_x, J2_y], ["J3", J3_x, J3_y],
              ["J4", J4_x, J4_y], ["J5", J5_x, J5_y]])
        echo(str("PART ", j[0], " ", j[1][0] - fan_grow_x, " ", j[1][1] + fan_grow_x,
                 " ", j[2][0] - fan_grow_y, " ", j[2][1] + fan_grow_y,
                 " ", z_pcb_top, " ", z_pcb_top + h_fan));
    echo(str("PART C1 ", C1_x[0], " ", C1_x[1], " ", C1_y[0], " ", C1_y[1],
             " ", z_pcb_top, " ", z_pcb_top + 12.5));
}
else if (part == "lid_guide") {
    // For viewing only: lid in print orientation with the light guide lifted
    // off. Not for STL export - the two parts are printed separately and in
    // different materials.
    color("wheat")
        translate([0, 0, z_lid_top]) rotate([180, 0, 0]) lid();
    color(col_guide, 0.65)
        translate([0, 0, z_lid_top + 15]) rotate([180, 0, 0]) guide();
}
else if (part == "latch") {
    // Move the latch to the origin so the camera only has to point at
    // (0,0,0) - aiming in model coordinates is guesswork in an oblique view.
    translate([-snap_x[0], 0.5, -(z_rim - 2.7)]) {
        color("steelblue")  intersection() { tray(); cutbox(); }
        color("sandybrown") intersection() { lid();  cutbox(); }
    }
}
else if (part == "section") {
    // Section across one latch. Deliberately coloured unrealistically - in
    // two shades of cream you cannot tell which part is which in the section.
    color("steelblue")  intersection() { tray(); cutbox(); }
    color("sandybrown") intersection() { lid();  cutbox(); }
}
else if (part == "closed") {
    color(col_case)  tray();
    color("wheat") lid();
    color(col_guide) guide();
}
else {
    // Default view: see-through case, so the board and the openings can be inspected.
    color("ivory", 0.10) tray();
    board_mock(0.85);
    color("ivory", 0.10) lid();
    color("skyblue", 0.5) guide();
}
